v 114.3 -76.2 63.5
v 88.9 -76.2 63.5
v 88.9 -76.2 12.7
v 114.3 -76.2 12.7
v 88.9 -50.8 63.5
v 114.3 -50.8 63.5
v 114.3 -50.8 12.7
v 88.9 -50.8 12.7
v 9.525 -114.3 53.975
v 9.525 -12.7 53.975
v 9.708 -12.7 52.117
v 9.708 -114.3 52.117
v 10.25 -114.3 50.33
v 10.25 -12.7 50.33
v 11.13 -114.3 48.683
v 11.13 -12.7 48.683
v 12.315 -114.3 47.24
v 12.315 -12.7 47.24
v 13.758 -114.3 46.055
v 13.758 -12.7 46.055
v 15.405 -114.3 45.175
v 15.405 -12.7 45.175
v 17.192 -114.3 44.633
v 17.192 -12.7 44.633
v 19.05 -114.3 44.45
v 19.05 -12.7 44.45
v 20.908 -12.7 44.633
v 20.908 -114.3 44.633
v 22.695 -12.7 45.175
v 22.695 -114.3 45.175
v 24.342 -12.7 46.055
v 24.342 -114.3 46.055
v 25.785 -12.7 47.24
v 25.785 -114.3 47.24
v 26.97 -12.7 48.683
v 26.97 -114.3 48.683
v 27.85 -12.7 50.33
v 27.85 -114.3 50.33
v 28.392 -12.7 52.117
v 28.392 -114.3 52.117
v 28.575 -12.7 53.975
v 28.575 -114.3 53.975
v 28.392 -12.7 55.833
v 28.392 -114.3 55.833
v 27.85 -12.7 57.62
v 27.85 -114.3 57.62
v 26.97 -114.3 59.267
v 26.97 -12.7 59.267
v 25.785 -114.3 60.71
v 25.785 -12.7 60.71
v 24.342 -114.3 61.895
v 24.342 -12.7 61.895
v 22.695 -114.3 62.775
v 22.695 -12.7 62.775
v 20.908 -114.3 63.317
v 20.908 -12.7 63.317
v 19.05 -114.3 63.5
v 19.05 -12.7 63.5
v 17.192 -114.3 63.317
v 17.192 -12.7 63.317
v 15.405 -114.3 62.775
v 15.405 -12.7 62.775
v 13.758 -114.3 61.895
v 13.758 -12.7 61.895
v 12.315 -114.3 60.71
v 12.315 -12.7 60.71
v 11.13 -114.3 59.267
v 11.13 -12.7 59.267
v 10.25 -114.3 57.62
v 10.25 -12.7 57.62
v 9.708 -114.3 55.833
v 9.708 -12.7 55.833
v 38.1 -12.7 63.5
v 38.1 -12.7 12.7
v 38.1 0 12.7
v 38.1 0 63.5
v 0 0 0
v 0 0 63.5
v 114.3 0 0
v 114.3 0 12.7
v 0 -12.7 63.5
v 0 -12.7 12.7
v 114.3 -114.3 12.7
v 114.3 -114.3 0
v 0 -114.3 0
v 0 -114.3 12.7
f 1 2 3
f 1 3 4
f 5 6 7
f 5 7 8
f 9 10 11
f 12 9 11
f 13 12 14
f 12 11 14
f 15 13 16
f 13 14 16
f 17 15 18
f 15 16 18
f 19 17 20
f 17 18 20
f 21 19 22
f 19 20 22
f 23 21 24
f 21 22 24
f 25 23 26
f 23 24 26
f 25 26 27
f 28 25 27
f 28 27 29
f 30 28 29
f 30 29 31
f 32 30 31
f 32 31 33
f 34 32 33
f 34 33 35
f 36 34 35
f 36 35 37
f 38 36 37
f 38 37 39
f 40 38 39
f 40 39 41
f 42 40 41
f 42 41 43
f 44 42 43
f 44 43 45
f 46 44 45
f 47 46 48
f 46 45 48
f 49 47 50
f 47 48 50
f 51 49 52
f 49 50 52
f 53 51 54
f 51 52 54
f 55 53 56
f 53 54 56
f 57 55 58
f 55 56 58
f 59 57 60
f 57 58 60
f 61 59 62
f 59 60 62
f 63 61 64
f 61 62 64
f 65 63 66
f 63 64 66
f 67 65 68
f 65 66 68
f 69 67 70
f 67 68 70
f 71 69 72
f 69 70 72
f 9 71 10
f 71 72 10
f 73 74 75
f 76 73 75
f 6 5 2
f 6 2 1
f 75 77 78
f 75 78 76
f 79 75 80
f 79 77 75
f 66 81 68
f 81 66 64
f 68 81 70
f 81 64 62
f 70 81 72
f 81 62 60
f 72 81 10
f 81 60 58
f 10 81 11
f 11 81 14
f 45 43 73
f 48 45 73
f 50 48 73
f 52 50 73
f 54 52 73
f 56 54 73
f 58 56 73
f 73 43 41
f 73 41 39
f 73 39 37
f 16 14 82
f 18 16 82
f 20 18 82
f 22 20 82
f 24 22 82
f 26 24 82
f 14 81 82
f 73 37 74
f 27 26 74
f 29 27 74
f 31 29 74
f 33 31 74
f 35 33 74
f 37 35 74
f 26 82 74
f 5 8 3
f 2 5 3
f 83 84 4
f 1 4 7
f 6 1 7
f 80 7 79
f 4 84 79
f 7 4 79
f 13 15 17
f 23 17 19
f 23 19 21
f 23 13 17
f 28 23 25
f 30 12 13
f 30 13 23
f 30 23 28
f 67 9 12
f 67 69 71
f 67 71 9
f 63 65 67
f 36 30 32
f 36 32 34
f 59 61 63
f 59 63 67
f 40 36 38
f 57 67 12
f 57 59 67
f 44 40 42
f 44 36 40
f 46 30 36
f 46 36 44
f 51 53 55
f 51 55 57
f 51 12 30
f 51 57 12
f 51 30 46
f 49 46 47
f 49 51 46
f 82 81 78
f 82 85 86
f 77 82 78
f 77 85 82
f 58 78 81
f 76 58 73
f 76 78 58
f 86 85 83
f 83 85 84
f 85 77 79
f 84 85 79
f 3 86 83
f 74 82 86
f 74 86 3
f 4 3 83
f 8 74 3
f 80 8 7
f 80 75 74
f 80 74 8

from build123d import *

# Parameters (mm, degrees)
F0_W     = 114.3
F0_H     = 114.3
F1_DEPTH = 12.7
F2_W     = 38.1
F2_H     = 12.7
F3_DEPTH = 50.8
F5_DEPTH = 101.6
F7_DEPTH = 50.8


with BuildPart() as f1:
    # F0 (on Top) → F1 (new body)
    with BuildSketch(Plane.XY):
        with Locations((57.15, -57.15)):
            Rectangle(F0_W, F0_H)
    extrude(amount=F1_DEPTH)

    # F2 (on face) → F3 (join)
    with BuildSketch(Plane.XY.offset(12.7)):
        with Locations((19.05, -6.35)):
            Rectangle(F2_W, F2_H)
    extrude(amount=F3_DEPTH)

    # F4 (on face) → F5 (join, through all)
    with BuildSketch(Plane.XZ.offset(12.7)):
        with BuildLine():
            Line((9.525, 53.975), (28.575, 53.975))
            ThreePointArc((28.575, 53.975), (19.05, 63.5), (9.525, 53.975))
        make_face()
        with BuildLine():
            ThreePointArc((9.525, 53.975), (19.05, 44.45), (28.575, 53.975))
            Line((28.575, 53.975), (9.525, 53.975))
        make_face()
    extrude(amount=F5_DEPTH)

    # F6 (on face) → F7 (join, through all)
    with BuildSketch(Plane.XY.offset(12.7)):
        Polygon((114.3, -76.2), (114.3, -50.8), (88.9, -50.8), (88.9, -63.5), (88.9, -76.2), align=None)
    extrude(amount=F7_DEPTH)


solid = f1.part
